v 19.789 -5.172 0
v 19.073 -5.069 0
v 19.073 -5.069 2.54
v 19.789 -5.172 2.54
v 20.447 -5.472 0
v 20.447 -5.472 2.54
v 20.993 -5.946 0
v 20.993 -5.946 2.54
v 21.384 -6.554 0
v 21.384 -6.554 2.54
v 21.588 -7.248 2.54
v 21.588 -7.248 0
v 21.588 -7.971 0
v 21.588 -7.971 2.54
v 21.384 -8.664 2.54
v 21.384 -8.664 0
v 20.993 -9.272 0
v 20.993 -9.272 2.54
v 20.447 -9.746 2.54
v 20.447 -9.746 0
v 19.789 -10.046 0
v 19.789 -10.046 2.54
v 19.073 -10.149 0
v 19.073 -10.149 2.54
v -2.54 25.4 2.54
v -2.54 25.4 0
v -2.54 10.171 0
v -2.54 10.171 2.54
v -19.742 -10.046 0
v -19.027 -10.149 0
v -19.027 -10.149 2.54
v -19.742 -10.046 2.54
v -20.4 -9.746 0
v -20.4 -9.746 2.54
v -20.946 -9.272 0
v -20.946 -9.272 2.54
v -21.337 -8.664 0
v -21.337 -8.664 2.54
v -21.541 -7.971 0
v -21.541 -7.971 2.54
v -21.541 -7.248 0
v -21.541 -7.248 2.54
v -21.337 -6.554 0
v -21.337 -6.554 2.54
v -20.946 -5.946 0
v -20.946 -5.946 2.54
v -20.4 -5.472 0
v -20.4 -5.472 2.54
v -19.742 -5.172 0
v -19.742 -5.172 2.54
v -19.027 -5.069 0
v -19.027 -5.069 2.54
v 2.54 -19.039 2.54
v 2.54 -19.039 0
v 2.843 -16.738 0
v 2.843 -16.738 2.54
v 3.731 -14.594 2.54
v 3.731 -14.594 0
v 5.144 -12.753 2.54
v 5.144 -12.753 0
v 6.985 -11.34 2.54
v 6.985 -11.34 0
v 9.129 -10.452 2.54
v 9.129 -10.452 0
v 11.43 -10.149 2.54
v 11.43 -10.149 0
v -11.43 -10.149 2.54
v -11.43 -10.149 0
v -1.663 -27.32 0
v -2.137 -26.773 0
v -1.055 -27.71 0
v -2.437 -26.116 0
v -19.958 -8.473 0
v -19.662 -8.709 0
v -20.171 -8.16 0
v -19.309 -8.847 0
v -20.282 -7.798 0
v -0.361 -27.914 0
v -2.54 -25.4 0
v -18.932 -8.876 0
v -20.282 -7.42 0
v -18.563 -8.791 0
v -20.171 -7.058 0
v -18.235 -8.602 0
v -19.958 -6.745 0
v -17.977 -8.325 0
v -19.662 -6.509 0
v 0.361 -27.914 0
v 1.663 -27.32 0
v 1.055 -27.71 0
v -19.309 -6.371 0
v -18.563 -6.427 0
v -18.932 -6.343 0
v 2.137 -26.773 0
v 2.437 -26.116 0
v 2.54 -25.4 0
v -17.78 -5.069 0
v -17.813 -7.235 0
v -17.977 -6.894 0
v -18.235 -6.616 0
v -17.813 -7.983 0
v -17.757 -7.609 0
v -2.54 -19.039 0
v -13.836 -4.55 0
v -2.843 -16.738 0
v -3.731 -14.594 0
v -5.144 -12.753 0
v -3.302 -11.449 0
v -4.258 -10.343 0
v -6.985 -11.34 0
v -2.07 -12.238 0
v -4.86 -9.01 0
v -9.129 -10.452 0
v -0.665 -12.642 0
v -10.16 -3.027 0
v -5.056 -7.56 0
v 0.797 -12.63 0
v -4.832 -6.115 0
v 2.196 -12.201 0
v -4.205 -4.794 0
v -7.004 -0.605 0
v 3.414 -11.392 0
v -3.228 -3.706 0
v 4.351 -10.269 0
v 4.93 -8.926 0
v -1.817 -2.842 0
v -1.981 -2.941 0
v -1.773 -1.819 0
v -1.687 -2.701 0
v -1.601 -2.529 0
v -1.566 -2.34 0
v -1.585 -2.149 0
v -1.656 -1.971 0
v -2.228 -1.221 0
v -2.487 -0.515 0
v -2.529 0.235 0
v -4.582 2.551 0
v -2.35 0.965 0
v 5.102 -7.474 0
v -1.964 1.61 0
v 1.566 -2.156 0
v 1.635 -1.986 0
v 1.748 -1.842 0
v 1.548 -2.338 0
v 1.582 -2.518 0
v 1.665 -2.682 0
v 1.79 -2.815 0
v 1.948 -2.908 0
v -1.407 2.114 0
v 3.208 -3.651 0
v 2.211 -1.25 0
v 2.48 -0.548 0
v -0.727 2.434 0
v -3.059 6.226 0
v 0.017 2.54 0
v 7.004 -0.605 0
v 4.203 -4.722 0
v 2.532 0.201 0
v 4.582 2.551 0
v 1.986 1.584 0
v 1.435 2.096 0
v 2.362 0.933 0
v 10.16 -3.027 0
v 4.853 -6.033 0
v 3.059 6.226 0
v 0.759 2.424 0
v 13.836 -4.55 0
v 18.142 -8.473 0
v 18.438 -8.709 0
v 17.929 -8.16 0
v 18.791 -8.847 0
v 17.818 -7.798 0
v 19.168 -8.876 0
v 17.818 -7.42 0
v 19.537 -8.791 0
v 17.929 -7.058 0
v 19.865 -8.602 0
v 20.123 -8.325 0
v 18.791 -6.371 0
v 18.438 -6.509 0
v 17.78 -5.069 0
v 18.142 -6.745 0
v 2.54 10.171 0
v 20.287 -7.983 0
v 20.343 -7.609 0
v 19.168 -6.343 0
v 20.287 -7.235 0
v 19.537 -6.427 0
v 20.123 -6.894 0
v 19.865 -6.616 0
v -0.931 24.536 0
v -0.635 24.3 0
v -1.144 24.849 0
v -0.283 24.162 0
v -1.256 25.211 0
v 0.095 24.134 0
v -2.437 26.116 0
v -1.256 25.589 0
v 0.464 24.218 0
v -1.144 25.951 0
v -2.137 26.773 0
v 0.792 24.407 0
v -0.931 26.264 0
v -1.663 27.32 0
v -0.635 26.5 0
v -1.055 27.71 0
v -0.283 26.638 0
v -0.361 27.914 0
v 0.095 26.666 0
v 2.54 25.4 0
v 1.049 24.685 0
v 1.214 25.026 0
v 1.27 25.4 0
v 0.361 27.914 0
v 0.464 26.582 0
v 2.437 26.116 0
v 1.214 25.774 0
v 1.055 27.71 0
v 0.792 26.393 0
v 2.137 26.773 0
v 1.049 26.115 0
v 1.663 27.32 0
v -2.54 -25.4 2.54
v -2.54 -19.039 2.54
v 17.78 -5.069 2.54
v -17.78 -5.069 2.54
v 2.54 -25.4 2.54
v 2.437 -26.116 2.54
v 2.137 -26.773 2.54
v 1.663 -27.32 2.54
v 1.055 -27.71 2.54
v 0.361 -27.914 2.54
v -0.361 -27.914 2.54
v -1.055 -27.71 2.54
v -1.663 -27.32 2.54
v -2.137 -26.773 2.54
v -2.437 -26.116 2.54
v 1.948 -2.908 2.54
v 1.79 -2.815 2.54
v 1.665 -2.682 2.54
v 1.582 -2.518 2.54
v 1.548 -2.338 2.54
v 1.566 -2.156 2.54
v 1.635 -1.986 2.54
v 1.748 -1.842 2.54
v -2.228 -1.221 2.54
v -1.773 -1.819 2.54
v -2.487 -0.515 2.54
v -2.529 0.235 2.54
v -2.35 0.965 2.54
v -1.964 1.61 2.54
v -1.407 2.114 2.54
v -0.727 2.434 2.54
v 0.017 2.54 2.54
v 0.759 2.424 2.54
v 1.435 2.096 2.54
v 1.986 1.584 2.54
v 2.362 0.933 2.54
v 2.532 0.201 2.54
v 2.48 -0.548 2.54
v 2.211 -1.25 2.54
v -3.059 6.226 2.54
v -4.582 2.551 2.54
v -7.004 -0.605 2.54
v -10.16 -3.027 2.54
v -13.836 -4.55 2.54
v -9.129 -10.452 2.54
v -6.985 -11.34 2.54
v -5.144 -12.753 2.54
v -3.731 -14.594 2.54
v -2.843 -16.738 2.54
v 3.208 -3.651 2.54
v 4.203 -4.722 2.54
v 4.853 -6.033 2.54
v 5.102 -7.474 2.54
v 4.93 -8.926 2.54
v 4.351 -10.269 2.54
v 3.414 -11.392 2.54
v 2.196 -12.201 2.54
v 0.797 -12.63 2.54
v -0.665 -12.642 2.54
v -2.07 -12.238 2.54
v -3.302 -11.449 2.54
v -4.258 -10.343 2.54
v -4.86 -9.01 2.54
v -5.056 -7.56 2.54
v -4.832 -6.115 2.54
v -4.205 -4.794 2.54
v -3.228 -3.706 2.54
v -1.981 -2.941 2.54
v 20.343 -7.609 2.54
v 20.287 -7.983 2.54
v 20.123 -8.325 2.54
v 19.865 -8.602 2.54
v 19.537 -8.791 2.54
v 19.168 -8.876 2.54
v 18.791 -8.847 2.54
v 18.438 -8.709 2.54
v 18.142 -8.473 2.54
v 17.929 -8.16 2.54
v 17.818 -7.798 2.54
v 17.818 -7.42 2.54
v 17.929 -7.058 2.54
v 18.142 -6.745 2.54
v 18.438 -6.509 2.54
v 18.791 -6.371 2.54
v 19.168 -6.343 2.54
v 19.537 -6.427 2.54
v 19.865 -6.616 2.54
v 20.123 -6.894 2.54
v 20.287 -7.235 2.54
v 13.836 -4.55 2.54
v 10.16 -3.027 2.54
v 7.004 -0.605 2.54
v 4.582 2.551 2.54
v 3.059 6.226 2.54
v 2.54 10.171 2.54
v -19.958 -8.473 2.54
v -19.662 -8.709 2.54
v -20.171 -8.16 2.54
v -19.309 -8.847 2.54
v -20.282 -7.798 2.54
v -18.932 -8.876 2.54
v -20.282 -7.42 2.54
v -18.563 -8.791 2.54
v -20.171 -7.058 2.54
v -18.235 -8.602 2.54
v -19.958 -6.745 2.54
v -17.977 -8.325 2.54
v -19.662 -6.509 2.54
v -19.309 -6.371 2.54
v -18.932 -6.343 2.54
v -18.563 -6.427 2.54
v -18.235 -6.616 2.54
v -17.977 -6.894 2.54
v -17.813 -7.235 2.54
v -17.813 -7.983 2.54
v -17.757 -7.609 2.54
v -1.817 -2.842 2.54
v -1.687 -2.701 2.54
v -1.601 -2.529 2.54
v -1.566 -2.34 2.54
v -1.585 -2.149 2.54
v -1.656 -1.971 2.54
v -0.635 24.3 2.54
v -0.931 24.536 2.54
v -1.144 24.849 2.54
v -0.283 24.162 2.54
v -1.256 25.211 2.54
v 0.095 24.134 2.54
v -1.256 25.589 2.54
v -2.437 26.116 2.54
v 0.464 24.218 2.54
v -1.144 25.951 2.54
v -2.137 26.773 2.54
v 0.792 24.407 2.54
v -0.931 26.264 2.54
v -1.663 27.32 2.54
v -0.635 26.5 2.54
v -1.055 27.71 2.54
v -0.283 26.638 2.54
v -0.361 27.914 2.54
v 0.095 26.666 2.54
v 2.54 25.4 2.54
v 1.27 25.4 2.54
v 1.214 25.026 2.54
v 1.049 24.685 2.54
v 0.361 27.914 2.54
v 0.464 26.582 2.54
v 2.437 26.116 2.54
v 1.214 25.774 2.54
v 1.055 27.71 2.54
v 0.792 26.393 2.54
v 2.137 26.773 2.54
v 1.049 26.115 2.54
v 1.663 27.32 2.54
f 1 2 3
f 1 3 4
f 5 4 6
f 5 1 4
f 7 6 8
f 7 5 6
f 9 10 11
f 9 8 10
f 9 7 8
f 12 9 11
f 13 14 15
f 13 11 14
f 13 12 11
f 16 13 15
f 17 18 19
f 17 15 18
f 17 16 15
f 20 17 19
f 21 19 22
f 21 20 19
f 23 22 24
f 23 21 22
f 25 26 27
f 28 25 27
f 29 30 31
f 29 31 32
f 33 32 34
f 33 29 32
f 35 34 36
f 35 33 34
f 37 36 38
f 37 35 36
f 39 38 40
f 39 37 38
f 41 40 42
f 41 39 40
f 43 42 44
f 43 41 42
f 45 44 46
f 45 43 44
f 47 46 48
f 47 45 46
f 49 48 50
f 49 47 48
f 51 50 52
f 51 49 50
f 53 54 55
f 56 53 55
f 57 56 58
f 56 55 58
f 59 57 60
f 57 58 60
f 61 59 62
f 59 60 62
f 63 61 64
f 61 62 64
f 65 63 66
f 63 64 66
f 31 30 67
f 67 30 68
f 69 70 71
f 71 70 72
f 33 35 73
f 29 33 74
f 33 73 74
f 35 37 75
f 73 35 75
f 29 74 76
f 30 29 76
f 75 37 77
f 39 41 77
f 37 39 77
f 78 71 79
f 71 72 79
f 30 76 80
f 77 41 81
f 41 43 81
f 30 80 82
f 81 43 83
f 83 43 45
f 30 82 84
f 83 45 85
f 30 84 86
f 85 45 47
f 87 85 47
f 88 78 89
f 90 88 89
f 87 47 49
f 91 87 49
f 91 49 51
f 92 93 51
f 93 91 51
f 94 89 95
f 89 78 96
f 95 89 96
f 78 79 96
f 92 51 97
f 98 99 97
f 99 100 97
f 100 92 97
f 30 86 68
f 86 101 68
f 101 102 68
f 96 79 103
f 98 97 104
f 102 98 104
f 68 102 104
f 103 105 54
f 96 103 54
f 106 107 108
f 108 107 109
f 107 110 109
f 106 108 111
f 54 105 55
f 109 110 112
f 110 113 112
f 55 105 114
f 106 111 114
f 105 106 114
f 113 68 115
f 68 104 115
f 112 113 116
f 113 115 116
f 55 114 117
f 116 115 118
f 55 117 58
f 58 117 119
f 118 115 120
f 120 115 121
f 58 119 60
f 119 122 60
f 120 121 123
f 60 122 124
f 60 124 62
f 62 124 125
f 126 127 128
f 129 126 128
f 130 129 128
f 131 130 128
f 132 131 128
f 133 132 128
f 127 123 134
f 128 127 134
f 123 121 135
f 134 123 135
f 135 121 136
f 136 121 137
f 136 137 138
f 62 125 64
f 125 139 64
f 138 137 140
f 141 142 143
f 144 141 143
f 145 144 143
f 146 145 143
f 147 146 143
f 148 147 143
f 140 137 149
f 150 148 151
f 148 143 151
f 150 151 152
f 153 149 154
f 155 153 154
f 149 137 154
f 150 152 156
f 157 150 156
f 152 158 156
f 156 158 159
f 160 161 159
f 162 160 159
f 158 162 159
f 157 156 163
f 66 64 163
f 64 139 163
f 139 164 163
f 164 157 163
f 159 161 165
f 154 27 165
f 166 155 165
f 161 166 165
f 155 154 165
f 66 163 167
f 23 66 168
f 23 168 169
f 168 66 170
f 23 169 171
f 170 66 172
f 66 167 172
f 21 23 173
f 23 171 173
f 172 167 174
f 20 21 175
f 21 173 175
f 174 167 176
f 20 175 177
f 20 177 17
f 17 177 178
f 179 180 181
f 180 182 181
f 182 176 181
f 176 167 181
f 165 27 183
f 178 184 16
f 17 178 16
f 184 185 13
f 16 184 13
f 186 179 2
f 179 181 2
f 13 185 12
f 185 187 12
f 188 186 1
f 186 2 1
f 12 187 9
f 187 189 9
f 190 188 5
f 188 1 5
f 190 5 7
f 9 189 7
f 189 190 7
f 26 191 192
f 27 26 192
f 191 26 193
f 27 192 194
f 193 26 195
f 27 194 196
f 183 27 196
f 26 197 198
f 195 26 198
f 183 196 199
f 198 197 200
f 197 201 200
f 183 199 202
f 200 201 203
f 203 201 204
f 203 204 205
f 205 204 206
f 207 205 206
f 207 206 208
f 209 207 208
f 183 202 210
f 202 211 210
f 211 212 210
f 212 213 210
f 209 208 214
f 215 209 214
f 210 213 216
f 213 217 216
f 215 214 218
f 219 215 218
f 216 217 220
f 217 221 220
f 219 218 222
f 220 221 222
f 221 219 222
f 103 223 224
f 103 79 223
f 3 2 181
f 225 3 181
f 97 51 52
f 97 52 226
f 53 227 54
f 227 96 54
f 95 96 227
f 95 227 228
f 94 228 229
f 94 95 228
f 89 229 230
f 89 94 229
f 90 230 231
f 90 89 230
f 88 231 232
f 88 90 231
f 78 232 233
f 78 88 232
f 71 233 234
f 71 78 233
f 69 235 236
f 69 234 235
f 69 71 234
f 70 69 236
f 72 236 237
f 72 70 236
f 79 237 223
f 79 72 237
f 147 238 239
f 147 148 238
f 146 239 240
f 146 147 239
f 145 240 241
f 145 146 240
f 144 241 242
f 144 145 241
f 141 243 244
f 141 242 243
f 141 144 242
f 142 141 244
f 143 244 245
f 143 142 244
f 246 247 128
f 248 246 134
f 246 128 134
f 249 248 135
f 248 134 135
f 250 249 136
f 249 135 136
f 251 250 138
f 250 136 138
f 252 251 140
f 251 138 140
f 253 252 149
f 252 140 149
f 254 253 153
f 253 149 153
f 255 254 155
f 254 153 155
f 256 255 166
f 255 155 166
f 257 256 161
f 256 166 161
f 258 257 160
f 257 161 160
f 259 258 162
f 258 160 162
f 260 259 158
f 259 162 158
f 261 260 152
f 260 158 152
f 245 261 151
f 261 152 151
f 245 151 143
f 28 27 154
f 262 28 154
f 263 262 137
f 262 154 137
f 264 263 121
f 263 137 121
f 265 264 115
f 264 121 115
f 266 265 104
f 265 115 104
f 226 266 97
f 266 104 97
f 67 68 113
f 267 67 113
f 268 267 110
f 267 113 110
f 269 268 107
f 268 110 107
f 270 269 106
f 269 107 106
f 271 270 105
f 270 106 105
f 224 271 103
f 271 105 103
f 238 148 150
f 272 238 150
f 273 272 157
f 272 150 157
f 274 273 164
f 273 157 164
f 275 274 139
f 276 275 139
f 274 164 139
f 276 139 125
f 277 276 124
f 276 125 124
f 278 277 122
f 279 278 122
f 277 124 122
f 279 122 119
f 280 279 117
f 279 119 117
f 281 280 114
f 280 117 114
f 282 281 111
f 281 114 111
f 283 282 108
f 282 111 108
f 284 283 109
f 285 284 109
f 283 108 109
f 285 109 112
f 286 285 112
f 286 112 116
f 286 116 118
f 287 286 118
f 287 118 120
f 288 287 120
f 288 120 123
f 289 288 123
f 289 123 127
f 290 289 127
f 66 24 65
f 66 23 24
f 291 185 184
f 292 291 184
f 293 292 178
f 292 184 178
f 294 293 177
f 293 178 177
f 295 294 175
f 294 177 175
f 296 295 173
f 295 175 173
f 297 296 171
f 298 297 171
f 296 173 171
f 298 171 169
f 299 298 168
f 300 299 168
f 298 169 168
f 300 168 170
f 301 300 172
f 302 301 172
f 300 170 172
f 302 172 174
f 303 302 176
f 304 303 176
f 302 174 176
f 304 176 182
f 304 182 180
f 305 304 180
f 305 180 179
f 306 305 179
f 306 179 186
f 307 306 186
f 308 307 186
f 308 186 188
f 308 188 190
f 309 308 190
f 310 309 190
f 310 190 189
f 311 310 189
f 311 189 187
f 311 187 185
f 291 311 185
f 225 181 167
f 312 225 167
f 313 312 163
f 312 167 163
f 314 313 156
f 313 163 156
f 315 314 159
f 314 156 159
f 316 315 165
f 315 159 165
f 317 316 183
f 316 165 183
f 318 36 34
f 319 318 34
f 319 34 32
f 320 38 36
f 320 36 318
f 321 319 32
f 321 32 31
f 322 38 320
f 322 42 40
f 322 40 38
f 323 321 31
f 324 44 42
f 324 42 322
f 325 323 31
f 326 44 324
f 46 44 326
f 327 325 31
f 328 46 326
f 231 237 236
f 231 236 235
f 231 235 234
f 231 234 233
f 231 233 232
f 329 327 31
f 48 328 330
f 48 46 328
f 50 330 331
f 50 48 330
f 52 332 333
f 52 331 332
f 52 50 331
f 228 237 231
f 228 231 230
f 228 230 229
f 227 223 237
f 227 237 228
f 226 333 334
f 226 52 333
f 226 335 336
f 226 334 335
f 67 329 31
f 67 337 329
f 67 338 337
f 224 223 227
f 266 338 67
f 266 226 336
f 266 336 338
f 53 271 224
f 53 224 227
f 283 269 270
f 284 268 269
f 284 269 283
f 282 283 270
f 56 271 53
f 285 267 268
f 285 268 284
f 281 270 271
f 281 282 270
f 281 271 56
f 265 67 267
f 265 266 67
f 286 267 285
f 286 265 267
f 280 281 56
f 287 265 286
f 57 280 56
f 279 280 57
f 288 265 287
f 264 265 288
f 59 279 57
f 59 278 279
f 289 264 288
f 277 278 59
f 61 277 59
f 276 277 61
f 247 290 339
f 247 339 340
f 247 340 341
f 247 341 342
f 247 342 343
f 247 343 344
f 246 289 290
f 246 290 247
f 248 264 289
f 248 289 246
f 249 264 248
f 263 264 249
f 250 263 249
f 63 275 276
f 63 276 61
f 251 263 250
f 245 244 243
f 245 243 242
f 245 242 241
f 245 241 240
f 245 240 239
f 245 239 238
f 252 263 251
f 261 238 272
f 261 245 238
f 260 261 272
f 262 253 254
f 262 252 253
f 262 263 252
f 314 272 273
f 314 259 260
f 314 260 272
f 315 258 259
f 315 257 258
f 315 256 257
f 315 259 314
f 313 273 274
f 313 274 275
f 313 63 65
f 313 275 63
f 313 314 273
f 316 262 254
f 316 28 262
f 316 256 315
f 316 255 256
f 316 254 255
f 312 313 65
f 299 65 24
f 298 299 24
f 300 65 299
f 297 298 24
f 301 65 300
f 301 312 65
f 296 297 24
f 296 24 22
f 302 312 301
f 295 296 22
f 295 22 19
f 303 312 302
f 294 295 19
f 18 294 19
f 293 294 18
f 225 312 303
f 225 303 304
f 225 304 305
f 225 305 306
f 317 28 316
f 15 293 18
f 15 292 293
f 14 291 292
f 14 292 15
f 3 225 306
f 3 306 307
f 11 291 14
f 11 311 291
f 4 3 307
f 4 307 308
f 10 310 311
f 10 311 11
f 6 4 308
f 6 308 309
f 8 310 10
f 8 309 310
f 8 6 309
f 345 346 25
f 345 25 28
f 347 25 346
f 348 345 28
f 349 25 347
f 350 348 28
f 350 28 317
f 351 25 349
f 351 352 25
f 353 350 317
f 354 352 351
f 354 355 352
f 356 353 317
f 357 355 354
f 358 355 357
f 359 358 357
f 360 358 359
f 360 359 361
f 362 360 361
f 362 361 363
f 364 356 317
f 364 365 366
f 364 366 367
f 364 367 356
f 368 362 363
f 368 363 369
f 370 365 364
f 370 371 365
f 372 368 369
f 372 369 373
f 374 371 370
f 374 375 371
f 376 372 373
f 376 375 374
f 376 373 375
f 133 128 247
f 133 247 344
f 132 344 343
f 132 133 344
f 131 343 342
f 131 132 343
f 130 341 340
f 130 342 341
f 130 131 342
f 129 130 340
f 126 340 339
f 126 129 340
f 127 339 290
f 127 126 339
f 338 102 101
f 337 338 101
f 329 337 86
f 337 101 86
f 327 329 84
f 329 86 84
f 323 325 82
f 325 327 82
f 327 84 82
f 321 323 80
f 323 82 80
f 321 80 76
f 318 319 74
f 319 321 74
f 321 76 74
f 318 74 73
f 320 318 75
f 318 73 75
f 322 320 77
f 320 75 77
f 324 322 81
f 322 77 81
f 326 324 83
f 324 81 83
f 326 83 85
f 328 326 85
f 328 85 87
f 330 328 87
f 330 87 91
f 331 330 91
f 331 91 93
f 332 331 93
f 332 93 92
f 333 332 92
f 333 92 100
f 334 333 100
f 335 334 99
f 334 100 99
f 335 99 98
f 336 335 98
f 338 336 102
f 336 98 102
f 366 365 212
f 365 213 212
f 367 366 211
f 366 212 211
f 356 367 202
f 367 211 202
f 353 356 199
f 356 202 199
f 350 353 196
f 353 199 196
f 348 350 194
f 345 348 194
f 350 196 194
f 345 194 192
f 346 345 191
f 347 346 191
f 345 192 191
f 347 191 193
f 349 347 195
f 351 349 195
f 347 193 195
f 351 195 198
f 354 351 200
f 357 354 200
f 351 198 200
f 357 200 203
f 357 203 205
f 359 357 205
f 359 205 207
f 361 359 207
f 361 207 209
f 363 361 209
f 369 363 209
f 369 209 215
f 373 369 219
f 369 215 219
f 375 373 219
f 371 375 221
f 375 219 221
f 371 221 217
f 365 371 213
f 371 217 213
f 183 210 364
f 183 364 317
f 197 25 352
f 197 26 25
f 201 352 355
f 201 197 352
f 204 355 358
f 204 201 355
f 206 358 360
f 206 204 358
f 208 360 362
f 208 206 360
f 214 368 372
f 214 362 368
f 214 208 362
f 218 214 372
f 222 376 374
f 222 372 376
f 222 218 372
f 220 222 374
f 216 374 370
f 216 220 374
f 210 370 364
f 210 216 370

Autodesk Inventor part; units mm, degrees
ref_plane "YZ Plane" through (0, 0, 0) normal (1, 0, 0) x (0, 1, 0)
ref_plane "XZ Plane" through (0, 0, 0) normal (0, 1, 0) x (-1, 0, 0)
ref_plane "XY Plane" through (0, 0, 0) normal (0, 0, 1) x (1, 0, 0)
sketch "Sketch1" plane through (0, 0, 0) normal (0, 0, 1) x (1, 0, 0)
  line L0 (0, 0) -> (0, 25.4)
  line L1 (0, 0) -> (0, -25.4)
  line L2 (-19.0266, -7.6091) -> (19.0734, -7.6091)
  circle A0 centre (0, 0) radius 2.54
  circle A1 centre (0, 25.4) radius 2.54
  circle A2 centre (-19.0266, -7.6091) radius 2.54
  circle A3 centre (19.0734, -7.6091) radius 2.54
  circle A4 centre (0, -25.4) radius 2.54
  circle A5 centre (0.0234, -7.6091) radius 5.08
  arc A6 (-1.9812, -2.9413) -> (-1.7729, -1.8189) centre (-2.2521, -2.3105) ccw
  arc A7 (1.7485, -1.8423) -> (1.9483, -2.9079) centre (2.1929, -2.3105) ccw
  line L3 (-2.54, 25.4) -> (-2.54, 10.1709)
  line L4 (2.54, 25.4) -> (2.54, 10.1709)
  line L5 (-2.54, -25.4) -> (-2.54, -19.0391)
  line L6 (2.54, -25.4) -> (2.54, -19.0391)
  line L7 (19.0734, -10.1491) -> (11.43, -10.1491)
  line L8 (19.0734, -5.0691) -> (17.78, -5.0691)
  line L9 (-19.0266, -5.0691) -> (-17.78, -5.0691)
  line L10 (-19.0266, -10.1491) -> (-11.43, -10.1491)
  arc A8 (-17.78, -5.0691) -> (-2.54, 10.1709) centre (-17.78, 10.1709) ccw
  arc A9 (2.54, 10.1709) -> (17.78, -5.0691) centre (17.78, 10.1709) ccw
  arc A10 (-2.54, -19.0391) -> (-11.43, -10.1491) centre (-11.43, -19.0391) ccw
  arc A11 (11.43, -10.1491) -> (2.54, -19.0391) centre (11.43, -19.0391) ccw
  circle A12 centre (-19.0266, -7.6091) radius 1.27
  circle A13 centre (0, 25.4) radius 1.27
  circle A14 centre (19.0734, -7.6091) radius 1.27
  dimension "d0" = 25.4
  dimension "d1" = 25.4
  dimension "d2" = 38.1
  dimension "d3" = 38.1
  dimension "d5" = 5.08
  dimension "d6" = 5.08
  dimension "d7" = 5.08
  dimension "d8" = 5.08
  dimension "d9" = 7.6091
  dimension "d10" = 5.08
  dimension "d12" = 4.445
  dimension "d13" = 35.56
  dimension "d14" = 22.86
  dimension "d15" = 10.16
  dimension "d16" = 2.54
  dimension "d17" = 2.54
  dimension "d18" = 2.54
extrude "Extrusion1" add sketch "Sketch1" along normal blind 2.54 contours A0 A6 A5 L2 A2 L9 A8 L3 A1 L0 | L0 A1 L4 A9 L8 A3 L2 A5 A7 A0 | A1 | A5 L1 A4 L5 A10 L10 A2 L2 | A5 L2 A3 L7 A11 L6 A4 L1 | A2 | A4 | A3
properties part number "Fish Rib"
